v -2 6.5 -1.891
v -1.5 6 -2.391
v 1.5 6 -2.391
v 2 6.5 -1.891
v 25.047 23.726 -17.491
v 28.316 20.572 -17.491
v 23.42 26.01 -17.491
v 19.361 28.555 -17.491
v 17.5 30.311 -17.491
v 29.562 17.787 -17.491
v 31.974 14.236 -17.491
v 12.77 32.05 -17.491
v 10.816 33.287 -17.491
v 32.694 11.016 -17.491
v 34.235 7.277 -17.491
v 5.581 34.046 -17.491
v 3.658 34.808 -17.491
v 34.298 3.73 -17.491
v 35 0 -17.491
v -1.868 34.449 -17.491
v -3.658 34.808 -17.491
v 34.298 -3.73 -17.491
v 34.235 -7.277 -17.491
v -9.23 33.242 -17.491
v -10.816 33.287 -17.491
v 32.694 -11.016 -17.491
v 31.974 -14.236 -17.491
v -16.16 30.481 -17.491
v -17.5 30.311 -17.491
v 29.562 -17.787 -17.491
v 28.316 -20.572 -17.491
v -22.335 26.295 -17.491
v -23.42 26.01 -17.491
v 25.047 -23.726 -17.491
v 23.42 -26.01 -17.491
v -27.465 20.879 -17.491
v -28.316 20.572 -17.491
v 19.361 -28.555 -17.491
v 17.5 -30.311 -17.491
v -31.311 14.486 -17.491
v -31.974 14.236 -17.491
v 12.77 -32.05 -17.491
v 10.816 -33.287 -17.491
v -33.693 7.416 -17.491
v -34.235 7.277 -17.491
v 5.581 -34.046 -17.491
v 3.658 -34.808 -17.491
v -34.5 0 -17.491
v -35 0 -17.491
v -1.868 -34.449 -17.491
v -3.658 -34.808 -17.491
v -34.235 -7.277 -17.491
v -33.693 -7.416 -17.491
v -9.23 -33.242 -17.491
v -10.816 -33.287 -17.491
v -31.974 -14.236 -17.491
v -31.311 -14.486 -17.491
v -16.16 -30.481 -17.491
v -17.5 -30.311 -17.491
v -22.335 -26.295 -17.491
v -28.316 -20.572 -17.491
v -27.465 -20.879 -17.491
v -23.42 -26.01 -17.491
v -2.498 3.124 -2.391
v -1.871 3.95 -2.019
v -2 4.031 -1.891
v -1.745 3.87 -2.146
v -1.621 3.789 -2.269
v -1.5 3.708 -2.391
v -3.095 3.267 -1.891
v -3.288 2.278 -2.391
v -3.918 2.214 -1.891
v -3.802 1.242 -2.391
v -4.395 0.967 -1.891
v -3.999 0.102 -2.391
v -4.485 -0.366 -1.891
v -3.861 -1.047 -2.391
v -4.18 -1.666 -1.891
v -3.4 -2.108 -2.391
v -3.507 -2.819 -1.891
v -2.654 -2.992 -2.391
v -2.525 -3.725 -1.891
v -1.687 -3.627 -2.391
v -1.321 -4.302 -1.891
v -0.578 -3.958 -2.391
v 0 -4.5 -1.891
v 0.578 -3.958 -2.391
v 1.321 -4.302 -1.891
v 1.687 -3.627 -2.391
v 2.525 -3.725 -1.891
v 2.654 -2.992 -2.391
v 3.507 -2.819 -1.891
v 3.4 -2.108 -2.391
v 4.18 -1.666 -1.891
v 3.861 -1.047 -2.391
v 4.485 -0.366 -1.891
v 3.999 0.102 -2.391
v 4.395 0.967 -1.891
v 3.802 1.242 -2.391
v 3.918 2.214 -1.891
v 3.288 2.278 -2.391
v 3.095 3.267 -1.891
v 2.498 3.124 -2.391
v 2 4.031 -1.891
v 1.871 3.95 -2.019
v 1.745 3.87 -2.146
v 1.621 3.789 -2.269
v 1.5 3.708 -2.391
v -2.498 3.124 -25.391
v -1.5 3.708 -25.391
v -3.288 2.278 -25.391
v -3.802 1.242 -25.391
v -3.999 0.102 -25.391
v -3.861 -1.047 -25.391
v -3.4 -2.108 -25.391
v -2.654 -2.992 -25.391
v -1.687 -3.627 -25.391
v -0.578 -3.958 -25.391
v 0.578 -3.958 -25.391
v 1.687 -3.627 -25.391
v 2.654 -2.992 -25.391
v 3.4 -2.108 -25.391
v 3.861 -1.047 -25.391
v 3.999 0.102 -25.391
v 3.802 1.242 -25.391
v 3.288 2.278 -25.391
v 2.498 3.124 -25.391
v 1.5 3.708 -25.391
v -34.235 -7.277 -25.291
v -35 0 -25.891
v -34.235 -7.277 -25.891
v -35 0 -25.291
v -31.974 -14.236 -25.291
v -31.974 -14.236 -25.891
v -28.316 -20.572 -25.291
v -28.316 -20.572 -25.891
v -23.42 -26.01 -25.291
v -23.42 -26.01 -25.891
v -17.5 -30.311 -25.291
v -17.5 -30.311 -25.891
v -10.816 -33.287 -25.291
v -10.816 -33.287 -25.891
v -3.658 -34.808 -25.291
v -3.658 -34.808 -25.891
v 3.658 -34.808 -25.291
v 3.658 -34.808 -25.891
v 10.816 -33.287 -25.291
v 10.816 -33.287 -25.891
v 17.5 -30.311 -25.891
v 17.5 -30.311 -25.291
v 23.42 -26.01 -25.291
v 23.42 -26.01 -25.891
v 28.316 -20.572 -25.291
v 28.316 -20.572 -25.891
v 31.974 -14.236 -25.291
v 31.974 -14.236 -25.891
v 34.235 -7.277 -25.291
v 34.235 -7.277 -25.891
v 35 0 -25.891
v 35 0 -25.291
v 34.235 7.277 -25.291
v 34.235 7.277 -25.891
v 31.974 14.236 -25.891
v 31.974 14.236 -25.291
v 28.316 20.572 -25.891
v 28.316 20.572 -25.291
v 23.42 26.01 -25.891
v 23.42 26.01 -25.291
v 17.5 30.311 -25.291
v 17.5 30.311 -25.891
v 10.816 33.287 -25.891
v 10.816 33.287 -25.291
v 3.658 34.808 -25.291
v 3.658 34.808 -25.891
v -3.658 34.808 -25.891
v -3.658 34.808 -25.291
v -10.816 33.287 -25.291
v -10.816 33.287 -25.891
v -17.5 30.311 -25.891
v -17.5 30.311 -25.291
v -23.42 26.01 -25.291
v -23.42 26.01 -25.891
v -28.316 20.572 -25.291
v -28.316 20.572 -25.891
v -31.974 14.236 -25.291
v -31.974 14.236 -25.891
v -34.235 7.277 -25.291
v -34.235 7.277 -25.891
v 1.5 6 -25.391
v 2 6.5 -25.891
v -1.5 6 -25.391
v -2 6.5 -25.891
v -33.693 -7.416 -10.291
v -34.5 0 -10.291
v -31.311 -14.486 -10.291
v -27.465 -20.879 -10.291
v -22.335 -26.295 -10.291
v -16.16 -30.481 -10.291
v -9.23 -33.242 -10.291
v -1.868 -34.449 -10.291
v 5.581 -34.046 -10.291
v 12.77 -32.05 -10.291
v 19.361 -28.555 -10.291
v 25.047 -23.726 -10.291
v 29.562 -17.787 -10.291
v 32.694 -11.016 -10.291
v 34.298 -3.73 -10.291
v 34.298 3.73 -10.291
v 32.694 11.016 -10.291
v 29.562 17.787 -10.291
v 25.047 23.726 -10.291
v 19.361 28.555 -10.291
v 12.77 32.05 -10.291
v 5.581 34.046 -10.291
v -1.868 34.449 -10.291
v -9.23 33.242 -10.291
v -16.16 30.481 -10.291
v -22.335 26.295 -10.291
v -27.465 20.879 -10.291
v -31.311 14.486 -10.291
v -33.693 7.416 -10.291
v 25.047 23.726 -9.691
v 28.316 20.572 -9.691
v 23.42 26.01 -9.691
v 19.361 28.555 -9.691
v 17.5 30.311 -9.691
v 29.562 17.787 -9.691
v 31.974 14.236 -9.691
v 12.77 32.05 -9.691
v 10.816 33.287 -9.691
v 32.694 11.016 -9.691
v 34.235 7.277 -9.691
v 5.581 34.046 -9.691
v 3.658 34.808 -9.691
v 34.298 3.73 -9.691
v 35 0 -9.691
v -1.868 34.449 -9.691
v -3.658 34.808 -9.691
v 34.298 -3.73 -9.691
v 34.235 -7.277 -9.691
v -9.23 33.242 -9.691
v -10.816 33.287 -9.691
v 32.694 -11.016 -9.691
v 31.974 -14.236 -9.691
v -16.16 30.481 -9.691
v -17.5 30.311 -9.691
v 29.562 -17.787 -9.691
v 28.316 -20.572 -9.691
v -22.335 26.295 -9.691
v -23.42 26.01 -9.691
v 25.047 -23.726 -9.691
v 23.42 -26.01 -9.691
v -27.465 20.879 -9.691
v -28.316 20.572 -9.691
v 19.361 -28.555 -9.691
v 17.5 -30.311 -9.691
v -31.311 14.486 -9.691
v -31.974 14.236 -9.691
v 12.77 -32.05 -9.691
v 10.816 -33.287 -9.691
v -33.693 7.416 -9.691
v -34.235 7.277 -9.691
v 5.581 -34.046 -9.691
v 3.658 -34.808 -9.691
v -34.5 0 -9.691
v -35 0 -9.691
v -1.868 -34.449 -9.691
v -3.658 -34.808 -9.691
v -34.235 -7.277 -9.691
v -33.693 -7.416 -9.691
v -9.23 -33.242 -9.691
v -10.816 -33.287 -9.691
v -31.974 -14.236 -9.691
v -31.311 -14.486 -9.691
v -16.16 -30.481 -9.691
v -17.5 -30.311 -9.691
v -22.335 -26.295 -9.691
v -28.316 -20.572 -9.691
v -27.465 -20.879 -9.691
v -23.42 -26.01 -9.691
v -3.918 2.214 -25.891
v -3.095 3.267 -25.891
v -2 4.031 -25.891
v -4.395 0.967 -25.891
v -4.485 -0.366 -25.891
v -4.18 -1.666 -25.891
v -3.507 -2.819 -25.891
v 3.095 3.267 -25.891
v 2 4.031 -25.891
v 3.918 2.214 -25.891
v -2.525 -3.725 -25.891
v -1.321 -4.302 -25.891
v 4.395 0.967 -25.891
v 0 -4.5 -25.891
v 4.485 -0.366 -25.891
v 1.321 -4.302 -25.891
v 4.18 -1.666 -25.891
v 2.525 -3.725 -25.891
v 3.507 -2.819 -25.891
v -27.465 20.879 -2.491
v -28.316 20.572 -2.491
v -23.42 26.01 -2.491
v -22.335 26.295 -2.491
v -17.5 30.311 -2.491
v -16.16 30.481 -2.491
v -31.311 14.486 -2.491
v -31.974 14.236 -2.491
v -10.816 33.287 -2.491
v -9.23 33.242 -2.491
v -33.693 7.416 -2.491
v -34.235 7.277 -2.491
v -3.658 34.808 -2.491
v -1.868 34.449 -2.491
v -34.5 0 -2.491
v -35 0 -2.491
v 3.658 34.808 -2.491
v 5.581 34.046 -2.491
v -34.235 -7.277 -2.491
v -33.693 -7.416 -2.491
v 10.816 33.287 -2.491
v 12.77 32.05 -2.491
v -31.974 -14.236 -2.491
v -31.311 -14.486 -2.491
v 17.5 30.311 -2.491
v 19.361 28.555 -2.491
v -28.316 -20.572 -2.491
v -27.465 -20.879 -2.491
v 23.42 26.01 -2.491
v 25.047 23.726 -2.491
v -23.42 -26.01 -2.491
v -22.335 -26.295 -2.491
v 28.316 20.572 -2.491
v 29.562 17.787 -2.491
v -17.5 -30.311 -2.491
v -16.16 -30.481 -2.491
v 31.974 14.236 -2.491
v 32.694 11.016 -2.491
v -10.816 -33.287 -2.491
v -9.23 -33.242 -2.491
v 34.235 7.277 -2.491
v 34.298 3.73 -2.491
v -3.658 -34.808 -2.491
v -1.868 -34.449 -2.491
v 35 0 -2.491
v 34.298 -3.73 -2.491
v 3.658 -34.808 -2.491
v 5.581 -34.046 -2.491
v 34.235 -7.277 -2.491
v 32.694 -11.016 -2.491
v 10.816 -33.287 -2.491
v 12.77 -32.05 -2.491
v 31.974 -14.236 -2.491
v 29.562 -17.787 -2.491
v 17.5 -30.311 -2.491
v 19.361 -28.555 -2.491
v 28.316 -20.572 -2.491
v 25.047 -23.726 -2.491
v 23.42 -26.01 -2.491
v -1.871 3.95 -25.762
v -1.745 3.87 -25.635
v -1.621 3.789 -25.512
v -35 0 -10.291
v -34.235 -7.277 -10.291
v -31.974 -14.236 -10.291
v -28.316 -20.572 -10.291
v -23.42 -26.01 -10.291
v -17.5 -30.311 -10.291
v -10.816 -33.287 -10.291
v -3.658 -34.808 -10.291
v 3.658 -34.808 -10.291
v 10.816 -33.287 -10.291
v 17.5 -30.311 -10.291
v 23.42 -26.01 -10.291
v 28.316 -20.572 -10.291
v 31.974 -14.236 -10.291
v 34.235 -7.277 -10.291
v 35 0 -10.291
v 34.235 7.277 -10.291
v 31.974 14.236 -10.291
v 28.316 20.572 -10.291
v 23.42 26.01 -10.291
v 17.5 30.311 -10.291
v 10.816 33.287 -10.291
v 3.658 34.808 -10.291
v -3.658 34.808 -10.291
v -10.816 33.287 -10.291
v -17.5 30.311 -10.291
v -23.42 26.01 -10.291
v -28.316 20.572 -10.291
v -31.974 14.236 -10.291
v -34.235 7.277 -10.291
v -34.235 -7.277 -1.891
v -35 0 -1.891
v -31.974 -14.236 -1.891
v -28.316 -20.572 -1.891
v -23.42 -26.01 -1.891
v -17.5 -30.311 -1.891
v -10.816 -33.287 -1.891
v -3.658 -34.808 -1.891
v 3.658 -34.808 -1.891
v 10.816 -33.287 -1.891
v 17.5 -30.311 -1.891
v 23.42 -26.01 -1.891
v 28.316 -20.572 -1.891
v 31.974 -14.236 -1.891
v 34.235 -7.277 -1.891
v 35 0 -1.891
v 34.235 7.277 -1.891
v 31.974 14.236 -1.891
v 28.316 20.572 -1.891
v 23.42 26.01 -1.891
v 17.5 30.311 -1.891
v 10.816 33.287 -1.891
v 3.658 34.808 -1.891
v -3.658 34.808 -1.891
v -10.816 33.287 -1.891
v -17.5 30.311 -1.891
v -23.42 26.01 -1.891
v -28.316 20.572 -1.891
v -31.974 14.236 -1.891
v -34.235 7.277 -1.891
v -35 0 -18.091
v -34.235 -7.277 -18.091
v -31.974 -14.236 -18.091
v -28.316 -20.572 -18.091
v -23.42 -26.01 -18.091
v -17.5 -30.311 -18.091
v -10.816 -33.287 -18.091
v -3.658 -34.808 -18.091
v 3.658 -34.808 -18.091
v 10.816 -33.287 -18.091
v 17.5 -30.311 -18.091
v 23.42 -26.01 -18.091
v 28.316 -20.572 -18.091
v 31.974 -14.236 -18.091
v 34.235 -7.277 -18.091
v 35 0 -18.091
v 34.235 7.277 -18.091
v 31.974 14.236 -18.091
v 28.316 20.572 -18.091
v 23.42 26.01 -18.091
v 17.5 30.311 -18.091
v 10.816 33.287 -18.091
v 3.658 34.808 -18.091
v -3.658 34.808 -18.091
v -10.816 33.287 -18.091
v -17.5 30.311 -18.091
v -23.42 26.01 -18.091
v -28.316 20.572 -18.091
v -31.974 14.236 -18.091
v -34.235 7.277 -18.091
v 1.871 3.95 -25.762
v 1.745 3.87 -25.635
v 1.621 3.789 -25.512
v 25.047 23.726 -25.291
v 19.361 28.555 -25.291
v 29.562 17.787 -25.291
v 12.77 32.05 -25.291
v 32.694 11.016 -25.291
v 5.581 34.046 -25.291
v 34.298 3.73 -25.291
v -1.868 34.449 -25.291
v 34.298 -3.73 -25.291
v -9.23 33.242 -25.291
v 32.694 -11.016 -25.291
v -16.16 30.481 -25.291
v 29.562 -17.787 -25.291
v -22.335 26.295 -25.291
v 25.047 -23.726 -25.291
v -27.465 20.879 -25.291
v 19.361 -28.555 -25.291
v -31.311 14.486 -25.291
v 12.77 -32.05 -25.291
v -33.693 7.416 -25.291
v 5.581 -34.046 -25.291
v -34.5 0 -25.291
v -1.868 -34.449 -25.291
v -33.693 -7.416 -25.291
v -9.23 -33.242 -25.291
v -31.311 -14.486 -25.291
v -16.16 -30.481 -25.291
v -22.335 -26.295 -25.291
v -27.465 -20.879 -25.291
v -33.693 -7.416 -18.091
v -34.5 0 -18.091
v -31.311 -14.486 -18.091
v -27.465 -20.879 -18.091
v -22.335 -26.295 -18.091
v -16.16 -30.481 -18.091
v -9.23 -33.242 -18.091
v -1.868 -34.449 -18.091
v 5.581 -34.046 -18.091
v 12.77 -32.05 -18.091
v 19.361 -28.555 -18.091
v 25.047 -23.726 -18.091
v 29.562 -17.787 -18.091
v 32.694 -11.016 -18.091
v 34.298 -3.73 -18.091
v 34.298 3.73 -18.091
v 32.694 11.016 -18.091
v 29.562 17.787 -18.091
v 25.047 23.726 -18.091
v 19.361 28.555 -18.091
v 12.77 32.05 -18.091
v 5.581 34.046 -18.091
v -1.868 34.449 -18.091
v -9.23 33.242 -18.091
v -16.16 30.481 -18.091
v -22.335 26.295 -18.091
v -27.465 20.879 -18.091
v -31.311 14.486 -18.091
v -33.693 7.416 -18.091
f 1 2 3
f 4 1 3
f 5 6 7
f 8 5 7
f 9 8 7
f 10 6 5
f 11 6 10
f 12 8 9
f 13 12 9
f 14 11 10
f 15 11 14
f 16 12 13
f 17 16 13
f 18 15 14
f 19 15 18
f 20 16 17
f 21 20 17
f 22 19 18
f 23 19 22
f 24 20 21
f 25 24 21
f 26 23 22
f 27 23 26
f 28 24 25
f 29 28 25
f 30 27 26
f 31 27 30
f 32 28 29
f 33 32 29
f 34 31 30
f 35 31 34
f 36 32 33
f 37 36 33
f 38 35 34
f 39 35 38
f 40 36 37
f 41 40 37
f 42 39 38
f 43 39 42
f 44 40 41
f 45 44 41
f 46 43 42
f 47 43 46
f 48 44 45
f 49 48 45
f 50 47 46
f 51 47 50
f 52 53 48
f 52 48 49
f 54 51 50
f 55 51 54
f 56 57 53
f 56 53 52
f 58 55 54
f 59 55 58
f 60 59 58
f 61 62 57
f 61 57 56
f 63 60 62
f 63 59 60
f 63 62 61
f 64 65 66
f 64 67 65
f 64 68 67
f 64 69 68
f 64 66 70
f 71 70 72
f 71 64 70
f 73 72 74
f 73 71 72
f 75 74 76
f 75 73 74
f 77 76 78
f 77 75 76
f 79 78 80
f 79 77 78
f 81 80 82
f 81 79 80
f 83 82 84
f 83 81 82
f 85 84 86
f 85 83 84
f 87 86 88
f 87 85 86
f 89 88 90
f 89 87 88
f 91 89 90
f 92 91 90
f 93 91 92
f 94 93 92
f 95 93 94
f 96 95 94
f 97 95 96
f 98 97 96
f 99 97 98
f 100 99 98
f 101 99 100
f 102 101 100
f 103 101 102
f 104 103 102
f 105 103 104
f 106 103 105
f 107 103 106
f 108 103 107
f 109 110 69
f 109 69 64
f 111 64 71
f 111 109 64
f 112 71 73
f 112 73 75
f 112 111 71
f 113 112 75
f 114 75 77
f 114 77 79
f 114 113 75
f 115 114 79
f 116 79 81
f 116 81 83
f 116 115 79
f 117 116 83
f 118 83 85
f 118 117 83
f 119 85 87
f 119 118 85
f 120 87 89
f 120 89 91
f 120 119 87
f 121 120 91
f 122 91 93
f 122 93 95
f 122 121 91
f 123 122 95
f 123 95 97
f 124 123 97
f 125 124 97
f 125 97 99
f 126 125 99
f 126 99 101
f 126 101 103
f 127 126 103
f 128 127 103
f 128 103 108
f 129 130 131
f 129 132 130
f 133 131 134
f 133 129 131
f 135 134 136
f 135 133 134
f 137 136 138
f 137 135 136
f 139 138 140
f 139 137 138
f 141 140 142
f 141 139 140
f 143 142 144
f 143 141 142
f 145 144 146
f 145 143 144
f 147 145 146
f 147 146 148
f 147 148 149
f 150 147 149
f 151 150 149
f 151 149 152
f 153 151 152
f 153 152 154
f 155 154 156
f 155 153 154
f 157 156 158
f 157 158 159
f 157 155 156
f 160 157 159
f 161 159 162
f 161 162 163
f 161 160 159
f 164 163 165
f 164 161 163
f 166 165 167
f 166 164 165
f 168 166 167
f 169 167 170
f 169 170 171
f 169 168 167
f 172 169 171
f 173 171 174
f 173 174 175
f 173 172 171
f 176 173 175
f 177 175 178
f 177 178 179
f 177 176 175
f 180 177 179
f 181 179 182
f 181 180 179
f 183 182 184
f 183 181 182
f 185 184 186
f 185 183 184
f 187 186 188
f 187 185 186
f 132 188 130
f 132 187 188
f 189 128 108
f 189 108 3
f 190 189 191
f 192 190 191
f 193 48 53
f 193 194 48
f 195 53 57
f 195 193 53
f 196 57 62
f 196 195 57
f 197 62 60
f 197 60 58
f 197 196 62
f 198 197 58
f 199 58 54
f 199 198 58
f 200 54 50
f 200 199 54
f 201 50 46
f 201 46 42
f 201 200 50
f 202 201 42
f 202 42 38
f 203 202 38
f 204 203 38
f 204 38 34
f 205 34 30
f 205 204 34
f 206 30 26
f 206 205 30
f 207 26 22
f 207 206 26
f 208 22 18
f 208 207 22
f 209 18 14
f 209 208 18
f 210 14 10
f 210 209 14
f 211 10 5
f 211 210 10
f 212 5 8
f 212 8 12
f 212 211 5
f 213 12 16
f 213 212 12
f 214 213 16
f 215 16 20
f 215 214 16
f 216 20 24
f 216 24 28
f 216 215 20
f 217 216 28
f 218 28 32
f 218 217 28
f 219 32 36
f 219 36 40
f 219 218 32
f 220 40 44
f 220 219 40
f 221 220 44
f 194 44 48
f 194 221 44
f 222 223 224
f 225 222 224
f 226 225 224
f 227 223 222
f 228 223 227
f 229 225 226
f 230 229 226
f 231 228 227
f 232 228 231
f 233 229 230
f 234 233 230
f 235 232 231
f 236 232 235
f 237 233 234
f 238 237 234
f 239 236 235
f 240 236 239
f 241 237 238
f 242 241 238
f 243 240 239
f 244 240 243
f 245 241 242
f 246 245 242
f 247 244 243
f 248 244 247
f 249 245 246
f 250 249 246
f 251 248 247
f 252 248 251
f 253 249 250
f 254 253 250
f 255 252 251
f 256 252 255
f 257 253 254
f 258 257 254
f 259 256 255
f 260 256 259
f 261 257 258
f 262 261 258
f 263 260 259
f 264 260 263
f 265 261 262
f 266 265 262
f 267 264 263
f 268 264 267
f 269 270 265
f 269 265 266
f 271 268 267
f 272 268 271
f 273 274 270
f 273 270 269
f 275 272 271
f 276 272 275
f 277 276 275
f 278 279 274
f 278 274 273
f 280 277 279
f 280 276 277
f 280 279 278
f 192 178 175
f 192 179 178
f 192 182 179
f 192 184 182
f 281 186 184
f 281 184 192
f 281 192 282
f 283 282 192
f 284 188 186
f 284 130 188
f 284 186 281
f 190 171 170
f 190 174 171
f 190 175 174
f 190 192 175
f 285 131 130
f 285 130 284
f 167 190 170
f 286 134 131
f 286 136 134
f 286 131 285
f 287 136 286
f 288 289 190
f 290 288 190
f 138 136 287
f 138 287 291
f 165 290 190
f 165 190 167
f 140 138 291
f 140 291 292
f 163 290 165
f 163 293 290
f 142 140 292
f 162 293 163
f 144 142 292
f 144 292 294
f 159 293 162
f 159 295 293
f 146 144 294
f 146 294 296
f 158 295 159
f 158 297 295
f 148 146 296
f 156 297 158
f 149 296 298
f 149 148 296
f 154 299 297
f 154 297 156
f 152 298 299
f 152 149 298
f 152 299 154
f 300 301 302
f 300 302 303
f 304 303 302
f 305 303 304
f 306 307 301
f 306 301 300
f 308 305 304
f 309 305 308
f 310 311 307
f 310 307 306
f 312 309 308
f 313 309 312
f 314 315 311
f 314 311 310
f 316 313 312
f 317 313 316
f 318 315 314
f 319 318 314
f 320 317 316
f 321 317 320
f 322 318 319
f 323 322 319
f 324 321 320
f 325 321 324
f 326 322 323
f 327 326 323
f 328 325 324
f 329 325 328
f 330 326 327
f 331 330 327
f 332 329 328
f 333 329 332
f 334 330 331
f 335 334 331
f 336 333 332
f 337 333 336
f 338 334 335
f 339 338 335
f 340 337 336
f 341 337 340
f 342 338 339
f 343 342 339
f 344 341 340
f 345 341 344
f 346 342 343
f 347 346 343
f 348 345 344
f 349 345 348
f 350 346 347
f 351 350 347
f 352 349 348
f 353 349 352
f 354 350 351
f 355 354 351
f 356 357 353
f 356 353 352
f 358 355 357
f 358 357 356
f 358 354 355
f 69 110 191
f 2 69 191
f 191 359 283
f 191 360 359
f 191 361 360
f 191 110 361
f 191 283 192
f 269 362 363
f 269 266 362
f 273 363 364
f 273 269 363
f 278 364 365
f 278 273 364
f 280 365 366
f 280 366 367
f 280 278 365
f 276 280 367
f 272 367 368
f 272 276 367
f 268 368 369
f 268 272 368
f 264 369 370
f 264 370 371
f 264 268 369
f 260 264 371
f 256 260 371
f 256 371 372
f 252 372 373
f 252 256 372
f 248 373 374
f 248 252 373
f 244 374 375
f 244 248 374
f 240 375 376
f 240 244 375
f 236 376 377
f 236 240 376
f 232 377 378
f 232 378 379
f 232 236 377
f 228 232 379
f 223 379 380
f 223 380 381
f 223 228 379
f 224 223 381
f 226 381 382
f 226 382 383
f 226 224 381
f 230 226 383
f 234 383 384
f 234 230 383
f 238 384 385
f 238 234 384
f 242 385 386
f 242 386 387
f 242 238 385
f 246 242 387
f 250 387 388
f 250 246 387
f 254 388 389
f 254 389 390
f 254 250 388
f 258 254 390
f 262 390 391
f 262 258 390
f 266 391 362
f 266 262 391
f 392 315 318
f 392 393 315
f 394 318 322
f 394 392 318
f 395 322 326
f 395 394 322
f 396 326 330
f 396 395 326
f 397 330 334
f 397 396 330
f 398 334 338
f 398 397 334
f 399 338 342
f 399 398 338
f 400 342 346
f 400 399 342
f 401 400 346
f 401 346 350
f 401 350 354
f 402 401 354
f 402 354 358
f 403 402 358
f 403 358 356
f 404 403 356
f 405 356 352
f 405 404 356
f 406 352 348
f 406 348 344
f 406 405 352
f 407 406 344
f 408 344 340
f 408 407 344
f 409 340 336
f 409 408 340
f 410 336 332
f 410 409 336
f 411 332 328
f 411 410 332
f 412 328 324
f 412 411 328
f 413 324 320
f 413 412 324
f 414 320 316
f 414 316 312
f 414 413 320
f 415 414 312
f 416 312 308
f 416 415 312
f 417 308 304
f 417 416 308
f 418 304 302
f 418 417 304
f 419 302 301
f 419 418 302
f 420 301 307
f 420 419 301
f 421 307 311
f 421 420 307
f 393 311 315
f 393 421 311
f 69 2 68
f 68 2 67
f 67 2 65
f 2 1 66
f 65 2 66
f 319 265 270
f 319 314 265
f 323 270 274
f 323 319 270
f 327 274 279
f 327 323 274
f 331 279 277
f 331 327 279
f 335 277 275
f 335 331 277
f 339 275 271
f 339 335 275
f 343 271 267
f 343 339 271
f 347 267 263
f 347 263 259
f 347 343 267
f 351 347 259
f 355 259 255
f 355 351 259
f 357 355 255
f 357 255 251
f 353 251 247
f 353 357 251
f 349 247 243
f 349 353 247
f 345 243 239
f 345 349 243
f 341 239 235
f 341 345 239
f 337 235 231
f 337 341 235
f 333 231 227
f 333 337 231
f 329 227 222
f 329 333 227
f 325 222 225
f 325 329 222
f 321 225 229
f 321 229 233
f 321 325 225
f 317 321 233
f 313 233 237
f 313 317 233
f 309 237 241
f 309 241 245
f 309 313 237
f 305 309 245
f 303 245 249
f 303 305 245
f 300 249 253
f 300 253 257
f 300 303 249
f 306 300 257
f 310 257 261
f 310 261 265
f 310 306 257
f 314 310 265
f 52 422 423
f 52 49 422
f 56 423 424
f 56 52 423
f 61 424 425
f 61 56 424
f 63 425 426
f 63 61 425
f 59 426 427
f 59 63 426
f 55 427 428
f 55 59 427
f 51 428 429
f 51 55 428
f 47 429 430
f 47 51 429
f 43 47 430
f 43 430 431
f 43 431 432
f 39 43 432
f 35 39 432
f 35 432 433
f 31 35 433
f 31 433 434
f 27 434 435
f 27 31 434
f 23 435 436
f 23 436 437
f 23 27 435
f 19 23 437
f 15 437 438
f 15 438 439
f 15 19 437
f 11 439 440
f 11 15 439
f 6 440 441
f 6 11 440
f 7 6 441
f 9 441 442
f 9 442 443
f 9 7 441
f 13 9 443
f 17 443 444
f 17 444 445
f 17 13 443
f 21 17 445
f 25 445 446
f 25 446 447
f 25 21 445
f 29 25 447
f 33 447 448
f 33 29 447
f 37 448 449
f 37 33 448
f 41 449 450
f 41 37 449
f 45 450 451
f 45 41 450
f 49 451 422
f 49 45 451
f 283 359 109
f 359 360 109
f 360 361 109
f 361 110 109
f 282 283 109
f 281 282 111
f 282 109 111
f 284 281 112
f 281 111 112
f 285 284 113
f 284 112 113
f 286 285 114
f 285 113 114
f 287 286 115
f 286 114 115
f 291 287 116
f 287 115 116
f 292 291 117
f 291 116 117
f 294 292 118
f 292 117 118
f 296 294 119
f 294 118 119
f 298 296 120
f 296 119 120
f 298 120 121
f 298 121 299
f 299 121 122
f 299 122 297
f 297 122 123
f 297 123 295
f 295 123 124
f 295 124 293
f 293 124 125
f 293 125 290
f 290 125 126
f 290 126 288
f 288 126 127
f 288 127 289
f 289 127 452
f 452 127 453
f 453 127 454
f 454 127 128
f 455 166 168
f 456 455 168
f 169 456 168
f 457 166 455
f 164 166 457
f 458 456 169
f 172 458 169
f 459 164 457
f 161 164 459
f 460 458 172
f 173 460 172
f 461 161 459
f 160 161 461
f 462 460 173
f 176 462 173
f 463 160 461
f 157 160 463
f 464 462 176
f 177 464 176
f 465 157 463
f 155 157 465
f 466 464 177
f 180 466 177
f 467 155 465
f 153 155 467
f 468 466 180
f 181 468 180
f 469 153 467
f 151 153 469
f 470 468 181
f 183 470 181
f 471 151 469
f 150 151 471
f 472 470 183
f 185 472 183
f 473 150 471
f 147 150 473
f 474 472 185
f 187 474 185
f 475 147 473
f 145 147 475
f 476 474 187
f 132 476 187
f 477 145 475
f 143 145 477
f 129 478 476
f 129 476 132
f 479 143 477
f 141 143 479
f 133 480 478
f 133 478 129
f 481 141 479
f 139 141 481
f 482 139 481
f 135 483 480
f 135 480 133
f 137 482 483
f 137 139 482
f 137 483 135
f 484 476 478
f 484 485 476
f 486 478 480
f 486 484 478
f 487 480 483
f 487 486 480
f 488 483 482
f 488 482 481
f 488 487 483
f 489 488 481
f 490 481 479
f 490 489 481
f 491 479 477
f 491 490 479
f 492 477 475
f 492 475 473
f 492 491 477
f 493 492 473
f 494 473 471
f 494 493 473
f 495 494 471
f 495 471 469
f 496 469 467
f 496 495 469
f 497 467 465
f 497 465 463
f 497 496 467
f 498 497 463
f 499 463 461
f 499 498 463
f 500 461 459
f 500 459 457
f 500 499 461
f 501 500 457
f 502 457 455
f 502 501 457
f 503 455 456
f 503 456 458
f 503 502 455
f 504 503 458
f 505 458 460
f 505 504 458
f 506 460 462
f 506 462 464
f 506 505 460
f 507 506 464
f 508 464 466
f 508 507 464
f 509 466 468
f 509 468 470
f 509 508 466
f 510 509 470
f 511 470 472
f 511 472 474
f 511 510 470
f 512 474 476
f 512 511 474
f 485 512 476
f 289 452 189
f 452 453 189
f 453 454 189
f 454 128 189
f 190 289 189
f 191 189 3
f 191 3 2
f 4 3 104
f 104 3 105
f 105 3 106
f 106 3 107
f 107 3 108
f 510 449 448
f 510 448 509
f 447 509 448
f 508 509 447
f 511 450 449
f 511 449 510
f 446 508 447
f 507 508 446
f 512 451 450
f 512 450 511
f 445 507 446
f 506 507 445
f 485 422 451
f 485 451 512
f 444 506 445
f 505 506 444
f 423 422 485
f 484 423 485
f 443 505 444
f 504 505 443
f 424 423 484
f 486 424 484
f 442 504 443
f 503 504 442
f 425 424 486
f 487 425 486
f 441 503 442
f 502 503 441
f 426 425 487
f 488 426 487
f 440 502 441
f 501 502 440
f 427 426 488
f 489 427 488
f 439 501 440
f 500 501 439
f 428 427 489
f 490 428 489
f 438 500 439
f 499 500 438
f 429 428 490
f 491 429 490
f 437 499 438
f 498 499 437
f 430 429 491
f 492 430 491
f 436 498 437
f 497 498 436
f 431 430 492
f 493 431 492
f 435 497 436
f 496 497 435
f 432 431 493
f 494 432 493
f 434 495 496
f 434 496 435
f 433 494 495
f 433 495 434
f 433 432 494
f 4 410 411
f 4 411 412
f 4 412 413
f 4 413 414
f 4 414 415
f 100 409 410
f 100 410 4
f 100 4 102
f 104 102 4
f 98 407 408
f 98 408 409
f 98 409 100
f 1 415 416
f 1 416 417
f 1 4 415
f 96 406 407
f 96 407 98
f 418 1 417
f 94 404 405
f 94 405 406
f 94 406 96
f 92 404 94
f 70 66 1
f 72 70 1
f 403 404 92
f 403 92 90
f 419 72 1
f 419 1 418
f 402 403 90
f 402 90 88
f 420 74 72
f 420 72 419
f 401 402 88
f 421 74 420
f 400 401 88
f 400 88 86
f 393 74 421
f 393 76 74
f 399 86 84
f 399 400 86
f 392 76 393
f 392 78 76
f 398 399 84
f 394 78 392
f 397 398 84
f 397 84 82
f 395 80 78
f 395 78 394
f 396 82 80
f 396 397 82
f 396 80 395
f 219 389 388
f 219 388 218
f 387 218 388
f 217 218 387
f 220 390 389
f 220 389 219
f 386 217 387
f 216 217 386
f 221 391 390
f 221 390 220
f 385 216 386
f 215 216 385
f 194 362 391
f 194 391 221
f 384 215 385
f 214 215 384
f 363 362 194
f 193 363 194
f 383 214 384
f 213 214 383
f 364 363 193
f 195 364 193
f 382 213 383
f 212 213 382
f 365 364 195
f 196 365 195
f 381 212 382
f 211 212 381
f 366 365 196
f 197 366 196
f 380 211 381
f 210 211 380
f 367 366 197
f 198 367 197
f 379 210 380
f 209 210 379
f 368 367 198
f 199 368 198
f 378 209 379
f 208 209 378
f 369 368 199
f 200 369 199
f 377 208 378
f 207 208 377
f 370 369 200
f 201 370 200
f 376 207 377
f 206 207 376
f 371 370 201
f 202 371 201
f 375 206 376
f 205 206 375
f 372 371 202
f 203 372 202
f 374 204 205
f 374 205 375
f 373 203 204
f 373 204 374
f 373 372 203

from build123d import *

# Parameters (mm, degrees)
SKETCH2_W          = 3
SKETCH2_H          = 6
CUT_EXTRUDE1_DEPTH = 56.009090158
CHAMFER1_SIZE      = 0.5


with BuildPart() as part:
    # Sketch1 → Revolve1 (revolve)
    with BuildSketch(Plane(origin=(0, 0, 0), x_dir=(1, 0, 0), z_dir=(0, 1, 0))):
        Polygon((-4, 25.890517241), (-35, 25.890517241), (-35, 25.290517241), (-34.5, 25.290517241), (-34.5, 18.090517241), (-35, 18.090517241), (-35, 17.490517241), (-34.5, 17.490517241), (-34.5, 10.290517241), (-35, 10.290517241), (-35, 9.690517241), (-34.5, 9.690517241), (-34.5, 2.490517241), (-35, 2.490517241), (-35, 1.890517241), (-4, 1.890517241), align=None)
    revolve(axis=Axis((0, 0, -42.552298851), (0, 0, 1)))

    # Sketch2 → Cut-Extrude1 (cut, through all)
    with BuildSketch(Plane(origin=(0, 0, -25.890517241), x_dir=(-1, 0, 0), z_dir=(0, 0, -1))):
        with Locations((0, 3)):
            Rectangle(SKETCH2_W, SKETCH2_H)
    extrude(amount=-CUT_EXTRUDE1_DEPTH, mode=Mode.SUBTRACT)

    # Chamfer1
    chamfer1_edges = [part.edges().sort_by_distance(p)[0] for p in [
        (0, -4, -25.890517241),
        (-1.5, 4.854049622, -25.890517241),
        (0, -4, -1.890517241),
        (-1.5, 4.854049622, -1.890517241),
        (1.5, 4.854049622, -1.890517241),
        (0, 6, -1.890517241),
        (0, 6, -25.890517241),
        (1.5, 4.854049622, -25.890517241),
    ]]
    chamfer(chamfer1_edges, length=CHAMFER1_SIZE)


solid = part.part
